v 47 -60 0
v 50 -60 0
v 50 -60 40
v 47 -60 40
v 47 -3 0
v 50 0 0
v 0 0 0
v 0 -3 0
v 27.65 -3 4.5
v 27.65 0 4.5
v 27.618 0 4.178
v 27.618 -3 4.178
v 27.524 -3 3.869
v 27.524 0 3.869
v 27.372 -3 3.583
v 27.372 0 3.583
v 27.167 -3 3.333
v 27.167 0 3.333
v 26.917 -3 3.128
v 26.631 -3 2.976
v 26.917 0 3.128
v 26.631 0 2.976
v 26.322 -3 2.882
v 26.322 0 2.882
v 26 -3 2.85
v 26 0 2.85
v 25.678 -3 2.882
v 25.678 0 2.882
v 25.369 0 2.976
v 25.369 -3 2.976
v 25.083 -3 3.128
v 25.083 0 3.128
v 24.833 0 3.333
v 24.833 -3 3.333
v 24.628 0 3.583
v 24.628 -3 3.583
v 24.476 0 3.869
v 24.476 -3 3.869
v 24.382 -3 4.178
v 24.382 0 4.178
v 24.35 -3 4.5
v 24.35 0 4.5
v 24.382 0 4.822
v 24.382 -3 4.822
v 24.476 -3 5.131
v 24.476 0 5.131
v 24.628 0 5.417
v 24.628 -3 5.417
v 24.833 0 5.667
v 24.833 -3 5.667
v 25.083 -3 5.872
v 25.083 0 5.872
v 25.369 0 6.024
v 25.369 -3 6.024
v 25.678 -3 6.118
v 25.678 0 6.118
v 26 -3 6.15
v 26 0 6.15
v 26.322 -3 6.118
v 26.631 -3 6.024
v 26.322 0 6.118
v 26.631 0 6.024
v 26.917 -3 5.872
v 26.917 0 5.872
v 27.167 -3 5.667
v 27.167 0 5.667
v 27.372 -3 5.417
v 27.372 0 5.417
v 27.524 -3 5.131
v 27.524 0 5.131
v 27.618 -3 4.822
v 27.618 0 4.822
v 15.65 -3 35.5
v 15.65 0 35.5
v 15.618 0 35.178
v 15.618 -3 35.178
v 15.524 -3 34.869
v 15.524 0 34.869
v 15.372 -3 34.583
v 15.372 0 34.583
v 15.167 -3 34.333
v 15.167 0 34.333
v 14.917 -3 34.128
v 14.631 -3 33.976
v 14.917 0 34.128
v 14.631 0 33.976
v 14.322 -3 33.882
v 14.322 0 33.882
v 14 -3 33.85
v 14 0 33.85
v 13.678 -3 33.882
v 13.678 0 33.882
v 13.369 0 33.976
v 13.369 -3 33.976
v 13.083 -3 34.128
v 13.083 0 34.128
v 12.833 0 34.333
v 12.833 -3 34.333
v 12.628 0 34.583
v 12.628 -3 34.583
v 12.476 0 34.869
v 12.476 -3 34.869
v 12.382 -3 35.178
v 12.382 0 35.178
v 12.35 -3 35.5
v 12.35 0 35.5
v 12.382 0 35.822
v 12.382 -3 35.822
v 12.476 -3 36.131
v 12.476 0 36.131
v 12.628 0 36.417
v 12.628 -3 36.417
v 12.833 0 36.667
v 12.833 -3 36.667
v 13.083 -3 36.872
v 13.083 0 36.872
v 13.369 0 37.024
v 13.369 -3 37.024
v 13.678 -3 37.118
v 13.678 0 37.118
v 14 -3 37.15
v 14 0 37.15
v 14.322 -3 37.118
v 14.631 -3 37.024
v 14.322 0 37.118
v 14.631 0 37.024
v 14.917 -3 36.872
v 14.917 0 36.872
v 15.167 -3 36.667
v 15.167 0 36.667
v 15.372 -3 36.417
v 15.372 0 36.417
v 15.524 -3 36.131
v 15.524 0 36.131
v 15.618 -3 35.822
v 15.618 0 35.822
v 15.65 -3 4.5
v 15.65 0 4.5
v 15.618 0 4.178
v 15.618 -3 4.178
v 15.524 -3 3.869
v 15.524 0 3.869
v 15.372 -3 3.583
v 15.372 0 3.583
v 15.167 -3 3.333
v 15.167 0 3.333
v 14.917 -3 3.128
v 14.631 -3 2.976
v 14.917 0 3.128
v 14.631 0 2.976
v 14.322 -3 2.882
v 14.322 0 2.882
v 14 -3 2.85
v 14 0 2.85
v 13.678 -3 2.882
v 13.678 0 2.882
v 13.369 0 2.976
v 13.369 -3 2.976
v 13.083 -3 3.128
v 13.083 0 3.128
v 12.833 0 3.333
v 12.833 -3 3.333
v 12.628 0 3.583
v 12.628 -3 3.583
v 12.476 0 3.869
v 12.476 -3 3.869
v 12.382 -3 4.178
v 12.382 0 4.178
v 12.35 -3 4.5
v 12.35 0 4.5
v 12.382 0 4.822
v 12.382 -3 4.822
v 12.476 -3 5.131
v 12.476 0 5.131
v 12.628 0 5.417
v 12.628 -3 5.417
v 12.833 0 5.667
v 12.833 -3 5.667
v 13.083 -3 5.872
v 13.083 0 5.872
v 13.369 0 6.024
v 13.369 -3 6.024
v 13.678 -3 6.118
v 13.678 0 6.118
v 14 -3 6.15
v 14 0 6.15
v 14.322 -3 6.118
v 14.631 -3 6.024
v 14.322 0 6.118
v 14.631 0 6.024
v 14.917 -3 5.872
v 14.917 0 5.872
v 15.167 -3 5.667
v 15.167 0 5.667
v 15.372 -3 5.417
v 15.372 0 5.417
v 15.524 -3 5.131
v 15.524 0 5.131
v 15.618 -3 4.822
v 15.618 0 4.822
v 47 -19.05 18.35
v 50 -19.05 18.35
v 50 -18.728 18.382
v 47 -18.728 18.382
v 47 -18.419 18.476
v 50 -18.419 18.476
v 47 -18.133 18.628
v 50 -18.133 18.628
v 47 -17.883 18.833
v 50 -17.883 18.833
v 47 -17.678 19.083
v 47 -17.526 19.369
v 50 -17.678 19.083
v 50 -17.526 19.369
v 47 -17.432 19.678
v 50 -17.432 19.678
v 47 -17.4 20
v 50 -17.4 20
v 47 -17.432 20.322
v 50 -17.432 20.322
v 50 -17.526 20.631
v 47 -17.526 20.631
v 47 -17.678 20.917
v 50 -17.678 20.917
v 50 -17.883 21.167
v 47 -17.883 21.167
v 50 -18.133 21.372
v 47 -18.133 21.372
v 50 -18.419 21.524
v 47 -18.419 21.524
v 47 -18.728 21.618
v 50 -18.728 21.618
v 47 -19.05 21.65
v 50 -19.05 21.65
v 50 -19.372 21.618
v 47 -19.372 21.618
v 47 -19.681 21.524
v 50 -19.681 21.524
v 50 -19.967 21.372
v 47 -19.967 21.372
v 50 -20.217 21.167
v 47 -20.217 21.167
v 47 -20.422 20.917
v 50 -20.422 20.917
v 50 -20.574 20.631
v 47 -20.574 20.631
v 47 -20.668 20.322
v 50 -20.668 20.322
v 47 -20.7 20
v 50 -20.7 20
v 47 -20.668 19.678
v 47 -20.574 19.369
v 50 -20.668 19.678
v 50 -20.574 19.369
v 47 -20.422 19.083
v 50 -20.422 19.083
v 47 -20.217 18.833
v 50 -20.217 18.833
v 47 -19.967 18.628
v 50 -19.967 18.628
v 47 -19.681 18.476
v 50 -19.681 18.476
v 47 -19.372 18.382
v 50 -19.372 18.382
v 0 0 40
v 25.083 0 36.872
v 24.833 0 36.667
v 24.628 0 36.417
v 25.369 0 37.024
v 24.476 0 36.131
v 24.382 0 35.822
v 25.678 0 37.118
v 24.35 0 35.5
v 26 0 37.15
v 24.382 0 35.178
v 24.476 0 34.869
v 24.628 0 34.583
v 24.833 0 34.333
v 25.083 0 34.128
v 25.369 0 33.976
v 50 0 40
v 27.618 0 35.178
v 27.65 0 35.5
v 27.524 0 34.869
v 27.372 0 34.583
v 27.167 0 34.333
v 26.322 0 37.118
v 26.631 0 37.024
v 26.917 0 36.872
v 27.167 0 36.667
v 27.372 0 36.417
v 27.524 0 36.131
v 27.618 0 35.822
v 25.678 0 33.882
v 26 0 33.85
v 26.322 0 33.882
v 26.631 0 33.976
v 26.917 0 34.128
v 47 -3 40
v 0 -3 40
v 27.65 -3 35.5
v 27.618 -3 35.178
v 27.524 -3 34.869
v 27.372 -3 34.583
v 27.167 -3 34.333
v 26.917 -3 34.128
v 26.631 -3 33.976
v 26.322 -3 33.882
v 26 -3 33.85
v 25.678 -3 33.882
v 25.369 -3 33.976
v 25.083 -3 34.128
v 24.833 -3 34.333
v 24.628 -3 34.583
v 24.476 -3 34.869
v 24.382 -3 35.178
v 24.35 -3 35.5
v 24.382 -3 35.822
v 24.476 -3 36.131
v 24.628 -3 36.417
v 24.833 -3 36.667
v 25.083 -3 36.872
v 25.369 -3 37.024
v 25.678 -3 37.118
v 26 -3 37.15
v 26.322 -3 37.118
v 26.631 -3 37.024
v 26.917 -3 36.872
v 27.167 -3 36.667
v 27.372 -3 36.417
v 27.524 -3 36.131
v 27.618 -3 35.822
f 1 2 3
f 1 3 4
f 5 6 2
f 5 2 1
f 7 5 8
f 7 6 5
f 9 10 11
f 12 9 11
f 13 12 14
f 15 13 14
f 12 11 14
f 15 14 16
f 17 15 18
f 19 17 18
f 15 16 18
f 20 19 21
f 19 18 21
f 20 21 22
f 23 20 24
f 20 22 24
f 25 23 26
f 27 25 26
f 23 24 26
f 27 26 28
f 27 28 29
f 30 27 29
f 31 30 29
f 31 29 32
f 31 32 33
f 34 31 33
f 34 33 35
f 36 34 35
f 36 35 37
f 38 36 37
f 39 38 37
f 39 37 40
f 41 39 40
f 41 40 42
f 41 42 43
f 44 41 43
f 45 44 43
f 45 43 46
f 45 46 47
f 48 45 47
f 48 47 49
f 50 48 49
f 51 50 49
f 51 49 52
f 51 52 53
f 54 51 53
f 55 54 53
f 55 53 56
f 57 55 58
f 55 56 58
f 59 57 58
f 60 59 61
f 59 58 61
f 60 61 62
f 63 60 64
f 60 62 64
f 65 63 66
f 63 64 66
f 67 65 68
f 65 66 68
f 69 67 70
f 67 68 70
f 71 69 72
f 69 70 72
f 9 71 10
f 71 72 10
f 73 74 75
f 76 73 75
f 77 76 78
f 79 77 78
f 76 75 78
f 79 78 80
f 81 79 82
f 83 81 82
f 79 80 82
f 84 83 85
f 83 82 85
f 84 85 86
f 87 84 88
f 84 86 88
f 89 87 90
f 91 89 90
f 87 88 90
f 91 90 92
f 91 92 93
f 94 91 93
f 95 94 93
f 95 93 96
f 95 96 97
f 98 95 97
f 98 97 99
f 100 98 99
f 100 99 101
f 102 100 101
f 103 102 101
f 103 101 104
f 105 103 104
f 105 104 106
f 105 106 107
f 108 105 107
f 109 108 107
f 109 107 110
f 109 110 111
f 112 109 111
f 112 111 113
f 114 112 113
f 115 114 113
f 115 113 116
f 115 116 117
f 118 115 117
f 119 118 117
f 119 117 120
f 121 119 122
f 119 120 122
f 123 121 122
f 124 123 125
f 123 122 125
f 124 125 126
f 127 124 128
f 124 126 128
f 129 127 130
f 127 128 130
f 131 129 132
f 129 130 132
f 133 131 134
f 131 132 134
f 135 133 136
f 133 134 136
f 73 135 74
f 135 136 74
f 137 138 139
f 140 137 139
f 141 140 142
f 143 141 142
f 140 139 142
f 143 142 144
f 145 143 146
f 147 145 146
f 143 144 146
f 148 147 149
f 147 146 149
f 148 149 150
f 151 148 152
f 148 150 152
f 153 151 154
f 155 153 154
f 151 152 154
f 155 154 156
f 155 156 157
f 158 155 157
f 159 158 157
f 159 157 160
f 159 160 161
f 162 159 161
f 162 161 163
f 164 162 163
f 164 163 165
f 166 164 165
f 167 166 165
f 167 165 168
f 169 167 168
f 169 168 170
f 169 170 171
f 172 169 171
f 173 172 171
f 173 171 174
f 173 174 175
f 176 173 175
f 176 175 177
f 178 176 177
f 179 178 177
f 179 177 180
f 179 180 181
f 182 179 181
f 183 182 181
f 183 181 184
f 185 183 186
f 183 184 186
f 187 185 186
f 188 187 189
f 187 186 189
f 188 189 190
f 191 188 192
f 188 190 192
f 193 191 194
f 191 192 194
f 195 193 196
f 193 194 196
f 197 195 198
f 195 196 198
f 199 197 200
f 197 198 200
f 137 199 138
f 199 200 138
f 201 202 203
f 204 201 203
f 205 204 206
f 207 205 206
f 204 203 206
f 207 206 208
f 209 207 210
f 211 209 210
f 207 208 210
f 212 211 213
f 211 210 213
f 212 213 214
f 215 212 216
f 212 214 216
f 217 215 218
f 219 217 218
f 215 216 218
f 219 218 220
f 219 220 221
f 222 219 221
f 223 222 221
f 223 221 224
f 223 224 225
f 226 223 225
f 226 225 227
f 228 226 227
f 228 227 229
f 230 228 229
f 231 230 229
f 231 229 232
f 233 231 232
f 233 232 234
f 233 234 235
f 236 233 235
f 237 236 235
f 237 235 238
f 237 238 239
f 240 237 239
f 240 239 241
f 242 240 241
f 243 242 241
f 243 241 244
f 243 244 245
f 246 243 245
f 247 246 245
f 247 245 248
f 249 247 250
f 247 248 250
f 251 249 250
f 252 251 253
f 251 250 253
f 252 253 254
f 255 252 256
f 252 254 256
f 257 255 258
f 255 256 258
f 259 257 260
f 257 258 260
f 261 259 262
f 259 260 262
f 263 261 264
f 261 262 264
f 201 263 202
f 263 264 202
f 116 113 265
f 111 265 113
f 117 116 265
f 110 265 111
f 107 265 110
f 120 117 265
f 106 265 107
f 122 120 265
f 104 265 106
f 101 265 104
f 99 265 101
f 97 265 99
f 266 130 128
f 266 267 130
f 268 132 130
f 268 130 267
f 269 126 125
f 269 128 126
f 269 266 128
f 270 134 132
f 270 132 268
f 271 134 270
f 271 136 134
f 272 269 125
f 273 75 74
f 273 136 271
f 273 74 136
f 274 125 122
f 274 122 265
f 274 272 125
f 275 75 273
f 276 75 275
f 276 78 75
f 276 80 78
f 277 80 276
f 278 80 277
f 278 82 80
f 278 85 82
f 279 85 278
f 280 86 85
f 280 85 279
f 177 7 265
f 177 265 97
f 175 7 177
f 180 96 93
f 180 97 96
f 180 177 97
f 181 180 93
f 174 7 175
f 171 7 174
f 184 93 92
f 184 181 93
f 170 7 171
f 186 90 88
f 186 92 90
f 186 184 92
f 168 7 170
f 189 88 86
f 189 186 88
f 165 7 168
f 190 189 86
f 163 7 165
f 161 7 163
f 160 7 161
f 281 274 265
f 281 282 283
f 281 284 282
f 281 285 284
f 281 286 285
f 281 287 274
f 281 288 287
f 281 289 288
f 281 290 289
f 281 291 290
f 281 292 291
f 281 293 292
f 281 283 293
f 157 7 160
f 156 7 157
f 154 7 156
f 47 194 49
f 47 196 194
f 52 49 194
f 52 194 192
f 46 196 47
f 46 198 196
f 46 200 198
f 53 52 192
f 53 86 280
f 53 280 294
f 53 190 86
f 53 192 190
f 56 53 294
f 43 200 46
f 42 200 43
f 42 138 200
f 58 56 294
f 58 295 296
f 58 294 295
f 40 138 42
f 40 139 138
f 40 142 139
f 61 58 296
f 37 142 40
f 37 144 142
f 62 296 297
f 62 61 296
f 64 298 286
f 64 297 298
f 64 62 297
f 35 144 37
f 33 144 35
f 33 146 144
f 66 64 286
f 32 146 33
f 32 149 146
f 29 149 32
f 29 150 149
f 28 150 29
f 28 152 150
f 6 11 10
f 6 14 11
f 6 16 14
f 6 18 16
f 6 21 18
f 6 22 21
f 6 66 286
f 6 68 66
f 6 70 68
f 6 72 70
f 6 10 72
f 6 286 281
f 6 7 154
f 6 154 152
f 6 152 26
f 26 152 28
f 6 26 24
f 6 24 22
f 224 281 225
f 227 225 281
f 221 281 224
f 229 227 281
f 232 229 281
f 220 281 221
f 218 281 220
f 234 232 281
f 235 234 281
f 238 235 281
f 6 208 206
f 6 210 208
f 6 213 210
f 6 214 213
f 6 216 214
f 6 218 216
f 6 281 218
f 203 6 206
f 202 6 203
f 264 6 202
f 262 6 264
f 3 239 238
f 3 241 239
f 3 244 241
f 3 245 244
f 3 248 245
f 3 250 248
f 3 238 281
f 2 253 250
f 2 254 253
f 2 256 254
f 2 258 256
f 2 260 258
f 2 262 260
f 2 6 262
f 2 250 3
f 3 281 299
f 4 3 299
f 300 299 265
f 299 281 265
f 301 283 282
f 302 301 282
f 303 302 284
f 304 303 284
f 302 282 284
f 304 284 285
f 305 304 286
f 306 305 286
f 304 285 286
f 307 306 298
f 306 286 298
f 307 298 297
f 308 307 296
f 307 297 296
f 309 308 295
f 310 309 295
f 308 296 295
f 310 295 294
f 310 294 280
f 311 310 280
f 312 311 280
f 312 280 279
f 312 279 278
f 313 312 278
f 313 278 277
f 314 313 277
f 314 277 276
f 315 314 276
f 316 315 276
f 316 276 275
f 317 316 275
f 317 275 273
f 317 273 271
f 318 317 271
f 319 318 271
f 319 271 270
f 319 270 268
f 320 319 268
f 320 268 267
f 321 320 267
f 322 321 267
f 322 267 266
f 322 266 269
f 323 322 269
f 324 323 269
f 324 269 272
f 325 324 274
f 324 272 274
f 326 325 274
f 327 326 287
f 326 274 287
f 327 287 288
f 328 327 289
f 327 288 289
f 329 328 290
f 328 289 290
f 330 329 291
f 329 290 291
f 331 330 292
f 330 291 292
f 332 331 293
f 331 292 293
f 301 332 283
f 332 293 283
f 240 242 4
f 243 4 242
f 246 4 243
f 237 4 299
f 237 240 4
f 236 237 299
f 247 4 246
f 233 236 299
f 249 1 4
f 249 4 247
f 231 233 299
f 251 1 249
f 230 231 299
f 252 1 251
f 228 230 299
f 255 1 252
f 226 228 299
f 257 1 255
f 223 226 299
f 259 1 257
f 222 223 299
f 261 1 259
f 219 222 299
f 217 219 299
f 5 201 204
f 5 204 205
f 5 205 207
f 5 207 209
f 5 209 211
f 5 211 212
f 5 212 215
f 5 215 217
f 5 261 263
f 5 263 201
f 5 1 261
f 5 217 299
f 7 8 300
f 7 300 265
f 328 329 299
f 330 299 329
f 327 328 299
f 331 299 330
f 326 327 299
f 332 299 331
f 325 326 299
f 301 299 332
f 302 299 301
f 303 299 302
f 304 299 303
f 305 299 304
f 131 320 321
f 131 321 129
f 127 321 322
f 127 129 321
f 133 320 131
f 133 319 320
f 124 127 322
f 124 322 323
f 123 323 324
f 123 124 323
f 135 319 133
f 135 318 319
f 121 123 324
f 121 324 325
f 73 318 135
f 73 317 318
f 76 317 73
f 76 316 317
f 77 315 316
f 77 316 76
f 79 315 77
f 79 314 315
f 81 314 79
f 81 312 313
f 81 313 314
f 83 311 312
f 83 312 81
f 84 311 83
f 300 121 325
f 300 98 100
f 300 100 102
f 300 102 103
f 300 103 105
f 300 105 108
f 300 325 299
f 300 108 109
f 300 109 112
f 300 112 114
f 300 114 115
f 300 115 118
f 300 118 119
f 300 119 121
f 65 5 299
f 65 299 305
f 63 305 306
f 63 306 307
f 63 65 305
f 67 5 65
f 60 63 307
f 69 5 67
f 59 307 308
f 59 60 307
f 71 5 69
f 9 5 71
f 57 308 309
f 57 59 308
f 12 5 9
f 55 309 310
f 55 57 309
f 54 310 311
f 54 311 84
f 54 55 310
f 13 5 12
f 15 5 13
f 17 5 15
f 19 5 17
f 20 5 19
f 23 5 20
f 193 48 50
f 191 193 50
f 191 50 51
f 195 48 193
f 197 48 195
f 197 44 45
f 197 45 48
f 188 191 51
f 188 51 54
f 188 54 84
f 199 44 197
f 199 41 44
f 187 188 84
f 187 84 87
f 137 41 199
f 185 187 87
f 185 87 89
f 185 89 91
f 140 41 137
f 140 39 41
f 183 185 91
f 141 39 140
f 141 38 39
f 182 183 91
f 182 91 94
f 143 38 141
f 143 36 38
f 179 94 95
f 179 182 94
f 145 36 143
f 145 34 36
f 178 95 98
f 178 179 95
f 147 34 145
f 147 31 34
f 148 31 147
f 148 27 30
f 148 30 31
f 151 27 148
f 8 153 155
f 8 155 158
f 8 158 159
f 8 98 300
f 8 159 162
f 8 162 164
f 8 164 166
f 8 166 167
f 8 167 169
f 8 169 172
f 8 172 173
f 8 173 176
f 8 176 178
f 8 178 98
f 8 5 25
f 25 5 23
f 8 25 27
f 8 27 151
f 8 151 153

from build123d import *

# Parameters (mm, degrees)
EXTRUDE_1_DEPTH     = 40
SKETCH_2_R          = 1.65
CUT_EXTRUDE_1_DEPTH = 10
SKETCH_3_R          = 1.65
CUT_EXTRUDE_2_DEPTH = 10


with BuildPart() as part:
    # 草图1 → 凸台-拉伸1 (new body)
    with BuildSketch(Plane.XY):
        Polygon((0, 0), (50, 0), (50, -60), (47, -60), (47, -3), (0, -3), align=None)
    extrude(amount=EXTRUDE_1_DEPTH)

    # 草图2 → 切除-拉伸1 (cut)
    with BuildSketch(Plane(origin=(0, 0, 0), x_dir=(1, 0, 0), z_dir=(0, 1, 0))):
        with Locations((14, -4.5)):
            Circle(SKETCH_2_R)
        with Locations((14, -35.5)):
            Circle(SKETCH_2_R)
        with Locations((26, -4.5)):
            Circle(SKETCH_2_R)
        with Locations((26, -35.5)):
            Circle(SKETCH_2_R)
    extrude(amount=-CUT_EXTRUDE_1_DEPTH, mode=Mode.SUBTRACT)

    # 草图3 → 切除-拉伸2 (cut)
    with BuildSketch(Plane(origin=(50, 0, 0), x_dir=(0, 0, -1), z_dir=(1, 0, 0))):
        with Locations((-20, -19.05)):
            Circle(SKETCH_3_R)
    extrude(amount=-CUT_EXTRUDE_2_DEPTH, mode=Mode.SUBTRACT)


solid = part.part
